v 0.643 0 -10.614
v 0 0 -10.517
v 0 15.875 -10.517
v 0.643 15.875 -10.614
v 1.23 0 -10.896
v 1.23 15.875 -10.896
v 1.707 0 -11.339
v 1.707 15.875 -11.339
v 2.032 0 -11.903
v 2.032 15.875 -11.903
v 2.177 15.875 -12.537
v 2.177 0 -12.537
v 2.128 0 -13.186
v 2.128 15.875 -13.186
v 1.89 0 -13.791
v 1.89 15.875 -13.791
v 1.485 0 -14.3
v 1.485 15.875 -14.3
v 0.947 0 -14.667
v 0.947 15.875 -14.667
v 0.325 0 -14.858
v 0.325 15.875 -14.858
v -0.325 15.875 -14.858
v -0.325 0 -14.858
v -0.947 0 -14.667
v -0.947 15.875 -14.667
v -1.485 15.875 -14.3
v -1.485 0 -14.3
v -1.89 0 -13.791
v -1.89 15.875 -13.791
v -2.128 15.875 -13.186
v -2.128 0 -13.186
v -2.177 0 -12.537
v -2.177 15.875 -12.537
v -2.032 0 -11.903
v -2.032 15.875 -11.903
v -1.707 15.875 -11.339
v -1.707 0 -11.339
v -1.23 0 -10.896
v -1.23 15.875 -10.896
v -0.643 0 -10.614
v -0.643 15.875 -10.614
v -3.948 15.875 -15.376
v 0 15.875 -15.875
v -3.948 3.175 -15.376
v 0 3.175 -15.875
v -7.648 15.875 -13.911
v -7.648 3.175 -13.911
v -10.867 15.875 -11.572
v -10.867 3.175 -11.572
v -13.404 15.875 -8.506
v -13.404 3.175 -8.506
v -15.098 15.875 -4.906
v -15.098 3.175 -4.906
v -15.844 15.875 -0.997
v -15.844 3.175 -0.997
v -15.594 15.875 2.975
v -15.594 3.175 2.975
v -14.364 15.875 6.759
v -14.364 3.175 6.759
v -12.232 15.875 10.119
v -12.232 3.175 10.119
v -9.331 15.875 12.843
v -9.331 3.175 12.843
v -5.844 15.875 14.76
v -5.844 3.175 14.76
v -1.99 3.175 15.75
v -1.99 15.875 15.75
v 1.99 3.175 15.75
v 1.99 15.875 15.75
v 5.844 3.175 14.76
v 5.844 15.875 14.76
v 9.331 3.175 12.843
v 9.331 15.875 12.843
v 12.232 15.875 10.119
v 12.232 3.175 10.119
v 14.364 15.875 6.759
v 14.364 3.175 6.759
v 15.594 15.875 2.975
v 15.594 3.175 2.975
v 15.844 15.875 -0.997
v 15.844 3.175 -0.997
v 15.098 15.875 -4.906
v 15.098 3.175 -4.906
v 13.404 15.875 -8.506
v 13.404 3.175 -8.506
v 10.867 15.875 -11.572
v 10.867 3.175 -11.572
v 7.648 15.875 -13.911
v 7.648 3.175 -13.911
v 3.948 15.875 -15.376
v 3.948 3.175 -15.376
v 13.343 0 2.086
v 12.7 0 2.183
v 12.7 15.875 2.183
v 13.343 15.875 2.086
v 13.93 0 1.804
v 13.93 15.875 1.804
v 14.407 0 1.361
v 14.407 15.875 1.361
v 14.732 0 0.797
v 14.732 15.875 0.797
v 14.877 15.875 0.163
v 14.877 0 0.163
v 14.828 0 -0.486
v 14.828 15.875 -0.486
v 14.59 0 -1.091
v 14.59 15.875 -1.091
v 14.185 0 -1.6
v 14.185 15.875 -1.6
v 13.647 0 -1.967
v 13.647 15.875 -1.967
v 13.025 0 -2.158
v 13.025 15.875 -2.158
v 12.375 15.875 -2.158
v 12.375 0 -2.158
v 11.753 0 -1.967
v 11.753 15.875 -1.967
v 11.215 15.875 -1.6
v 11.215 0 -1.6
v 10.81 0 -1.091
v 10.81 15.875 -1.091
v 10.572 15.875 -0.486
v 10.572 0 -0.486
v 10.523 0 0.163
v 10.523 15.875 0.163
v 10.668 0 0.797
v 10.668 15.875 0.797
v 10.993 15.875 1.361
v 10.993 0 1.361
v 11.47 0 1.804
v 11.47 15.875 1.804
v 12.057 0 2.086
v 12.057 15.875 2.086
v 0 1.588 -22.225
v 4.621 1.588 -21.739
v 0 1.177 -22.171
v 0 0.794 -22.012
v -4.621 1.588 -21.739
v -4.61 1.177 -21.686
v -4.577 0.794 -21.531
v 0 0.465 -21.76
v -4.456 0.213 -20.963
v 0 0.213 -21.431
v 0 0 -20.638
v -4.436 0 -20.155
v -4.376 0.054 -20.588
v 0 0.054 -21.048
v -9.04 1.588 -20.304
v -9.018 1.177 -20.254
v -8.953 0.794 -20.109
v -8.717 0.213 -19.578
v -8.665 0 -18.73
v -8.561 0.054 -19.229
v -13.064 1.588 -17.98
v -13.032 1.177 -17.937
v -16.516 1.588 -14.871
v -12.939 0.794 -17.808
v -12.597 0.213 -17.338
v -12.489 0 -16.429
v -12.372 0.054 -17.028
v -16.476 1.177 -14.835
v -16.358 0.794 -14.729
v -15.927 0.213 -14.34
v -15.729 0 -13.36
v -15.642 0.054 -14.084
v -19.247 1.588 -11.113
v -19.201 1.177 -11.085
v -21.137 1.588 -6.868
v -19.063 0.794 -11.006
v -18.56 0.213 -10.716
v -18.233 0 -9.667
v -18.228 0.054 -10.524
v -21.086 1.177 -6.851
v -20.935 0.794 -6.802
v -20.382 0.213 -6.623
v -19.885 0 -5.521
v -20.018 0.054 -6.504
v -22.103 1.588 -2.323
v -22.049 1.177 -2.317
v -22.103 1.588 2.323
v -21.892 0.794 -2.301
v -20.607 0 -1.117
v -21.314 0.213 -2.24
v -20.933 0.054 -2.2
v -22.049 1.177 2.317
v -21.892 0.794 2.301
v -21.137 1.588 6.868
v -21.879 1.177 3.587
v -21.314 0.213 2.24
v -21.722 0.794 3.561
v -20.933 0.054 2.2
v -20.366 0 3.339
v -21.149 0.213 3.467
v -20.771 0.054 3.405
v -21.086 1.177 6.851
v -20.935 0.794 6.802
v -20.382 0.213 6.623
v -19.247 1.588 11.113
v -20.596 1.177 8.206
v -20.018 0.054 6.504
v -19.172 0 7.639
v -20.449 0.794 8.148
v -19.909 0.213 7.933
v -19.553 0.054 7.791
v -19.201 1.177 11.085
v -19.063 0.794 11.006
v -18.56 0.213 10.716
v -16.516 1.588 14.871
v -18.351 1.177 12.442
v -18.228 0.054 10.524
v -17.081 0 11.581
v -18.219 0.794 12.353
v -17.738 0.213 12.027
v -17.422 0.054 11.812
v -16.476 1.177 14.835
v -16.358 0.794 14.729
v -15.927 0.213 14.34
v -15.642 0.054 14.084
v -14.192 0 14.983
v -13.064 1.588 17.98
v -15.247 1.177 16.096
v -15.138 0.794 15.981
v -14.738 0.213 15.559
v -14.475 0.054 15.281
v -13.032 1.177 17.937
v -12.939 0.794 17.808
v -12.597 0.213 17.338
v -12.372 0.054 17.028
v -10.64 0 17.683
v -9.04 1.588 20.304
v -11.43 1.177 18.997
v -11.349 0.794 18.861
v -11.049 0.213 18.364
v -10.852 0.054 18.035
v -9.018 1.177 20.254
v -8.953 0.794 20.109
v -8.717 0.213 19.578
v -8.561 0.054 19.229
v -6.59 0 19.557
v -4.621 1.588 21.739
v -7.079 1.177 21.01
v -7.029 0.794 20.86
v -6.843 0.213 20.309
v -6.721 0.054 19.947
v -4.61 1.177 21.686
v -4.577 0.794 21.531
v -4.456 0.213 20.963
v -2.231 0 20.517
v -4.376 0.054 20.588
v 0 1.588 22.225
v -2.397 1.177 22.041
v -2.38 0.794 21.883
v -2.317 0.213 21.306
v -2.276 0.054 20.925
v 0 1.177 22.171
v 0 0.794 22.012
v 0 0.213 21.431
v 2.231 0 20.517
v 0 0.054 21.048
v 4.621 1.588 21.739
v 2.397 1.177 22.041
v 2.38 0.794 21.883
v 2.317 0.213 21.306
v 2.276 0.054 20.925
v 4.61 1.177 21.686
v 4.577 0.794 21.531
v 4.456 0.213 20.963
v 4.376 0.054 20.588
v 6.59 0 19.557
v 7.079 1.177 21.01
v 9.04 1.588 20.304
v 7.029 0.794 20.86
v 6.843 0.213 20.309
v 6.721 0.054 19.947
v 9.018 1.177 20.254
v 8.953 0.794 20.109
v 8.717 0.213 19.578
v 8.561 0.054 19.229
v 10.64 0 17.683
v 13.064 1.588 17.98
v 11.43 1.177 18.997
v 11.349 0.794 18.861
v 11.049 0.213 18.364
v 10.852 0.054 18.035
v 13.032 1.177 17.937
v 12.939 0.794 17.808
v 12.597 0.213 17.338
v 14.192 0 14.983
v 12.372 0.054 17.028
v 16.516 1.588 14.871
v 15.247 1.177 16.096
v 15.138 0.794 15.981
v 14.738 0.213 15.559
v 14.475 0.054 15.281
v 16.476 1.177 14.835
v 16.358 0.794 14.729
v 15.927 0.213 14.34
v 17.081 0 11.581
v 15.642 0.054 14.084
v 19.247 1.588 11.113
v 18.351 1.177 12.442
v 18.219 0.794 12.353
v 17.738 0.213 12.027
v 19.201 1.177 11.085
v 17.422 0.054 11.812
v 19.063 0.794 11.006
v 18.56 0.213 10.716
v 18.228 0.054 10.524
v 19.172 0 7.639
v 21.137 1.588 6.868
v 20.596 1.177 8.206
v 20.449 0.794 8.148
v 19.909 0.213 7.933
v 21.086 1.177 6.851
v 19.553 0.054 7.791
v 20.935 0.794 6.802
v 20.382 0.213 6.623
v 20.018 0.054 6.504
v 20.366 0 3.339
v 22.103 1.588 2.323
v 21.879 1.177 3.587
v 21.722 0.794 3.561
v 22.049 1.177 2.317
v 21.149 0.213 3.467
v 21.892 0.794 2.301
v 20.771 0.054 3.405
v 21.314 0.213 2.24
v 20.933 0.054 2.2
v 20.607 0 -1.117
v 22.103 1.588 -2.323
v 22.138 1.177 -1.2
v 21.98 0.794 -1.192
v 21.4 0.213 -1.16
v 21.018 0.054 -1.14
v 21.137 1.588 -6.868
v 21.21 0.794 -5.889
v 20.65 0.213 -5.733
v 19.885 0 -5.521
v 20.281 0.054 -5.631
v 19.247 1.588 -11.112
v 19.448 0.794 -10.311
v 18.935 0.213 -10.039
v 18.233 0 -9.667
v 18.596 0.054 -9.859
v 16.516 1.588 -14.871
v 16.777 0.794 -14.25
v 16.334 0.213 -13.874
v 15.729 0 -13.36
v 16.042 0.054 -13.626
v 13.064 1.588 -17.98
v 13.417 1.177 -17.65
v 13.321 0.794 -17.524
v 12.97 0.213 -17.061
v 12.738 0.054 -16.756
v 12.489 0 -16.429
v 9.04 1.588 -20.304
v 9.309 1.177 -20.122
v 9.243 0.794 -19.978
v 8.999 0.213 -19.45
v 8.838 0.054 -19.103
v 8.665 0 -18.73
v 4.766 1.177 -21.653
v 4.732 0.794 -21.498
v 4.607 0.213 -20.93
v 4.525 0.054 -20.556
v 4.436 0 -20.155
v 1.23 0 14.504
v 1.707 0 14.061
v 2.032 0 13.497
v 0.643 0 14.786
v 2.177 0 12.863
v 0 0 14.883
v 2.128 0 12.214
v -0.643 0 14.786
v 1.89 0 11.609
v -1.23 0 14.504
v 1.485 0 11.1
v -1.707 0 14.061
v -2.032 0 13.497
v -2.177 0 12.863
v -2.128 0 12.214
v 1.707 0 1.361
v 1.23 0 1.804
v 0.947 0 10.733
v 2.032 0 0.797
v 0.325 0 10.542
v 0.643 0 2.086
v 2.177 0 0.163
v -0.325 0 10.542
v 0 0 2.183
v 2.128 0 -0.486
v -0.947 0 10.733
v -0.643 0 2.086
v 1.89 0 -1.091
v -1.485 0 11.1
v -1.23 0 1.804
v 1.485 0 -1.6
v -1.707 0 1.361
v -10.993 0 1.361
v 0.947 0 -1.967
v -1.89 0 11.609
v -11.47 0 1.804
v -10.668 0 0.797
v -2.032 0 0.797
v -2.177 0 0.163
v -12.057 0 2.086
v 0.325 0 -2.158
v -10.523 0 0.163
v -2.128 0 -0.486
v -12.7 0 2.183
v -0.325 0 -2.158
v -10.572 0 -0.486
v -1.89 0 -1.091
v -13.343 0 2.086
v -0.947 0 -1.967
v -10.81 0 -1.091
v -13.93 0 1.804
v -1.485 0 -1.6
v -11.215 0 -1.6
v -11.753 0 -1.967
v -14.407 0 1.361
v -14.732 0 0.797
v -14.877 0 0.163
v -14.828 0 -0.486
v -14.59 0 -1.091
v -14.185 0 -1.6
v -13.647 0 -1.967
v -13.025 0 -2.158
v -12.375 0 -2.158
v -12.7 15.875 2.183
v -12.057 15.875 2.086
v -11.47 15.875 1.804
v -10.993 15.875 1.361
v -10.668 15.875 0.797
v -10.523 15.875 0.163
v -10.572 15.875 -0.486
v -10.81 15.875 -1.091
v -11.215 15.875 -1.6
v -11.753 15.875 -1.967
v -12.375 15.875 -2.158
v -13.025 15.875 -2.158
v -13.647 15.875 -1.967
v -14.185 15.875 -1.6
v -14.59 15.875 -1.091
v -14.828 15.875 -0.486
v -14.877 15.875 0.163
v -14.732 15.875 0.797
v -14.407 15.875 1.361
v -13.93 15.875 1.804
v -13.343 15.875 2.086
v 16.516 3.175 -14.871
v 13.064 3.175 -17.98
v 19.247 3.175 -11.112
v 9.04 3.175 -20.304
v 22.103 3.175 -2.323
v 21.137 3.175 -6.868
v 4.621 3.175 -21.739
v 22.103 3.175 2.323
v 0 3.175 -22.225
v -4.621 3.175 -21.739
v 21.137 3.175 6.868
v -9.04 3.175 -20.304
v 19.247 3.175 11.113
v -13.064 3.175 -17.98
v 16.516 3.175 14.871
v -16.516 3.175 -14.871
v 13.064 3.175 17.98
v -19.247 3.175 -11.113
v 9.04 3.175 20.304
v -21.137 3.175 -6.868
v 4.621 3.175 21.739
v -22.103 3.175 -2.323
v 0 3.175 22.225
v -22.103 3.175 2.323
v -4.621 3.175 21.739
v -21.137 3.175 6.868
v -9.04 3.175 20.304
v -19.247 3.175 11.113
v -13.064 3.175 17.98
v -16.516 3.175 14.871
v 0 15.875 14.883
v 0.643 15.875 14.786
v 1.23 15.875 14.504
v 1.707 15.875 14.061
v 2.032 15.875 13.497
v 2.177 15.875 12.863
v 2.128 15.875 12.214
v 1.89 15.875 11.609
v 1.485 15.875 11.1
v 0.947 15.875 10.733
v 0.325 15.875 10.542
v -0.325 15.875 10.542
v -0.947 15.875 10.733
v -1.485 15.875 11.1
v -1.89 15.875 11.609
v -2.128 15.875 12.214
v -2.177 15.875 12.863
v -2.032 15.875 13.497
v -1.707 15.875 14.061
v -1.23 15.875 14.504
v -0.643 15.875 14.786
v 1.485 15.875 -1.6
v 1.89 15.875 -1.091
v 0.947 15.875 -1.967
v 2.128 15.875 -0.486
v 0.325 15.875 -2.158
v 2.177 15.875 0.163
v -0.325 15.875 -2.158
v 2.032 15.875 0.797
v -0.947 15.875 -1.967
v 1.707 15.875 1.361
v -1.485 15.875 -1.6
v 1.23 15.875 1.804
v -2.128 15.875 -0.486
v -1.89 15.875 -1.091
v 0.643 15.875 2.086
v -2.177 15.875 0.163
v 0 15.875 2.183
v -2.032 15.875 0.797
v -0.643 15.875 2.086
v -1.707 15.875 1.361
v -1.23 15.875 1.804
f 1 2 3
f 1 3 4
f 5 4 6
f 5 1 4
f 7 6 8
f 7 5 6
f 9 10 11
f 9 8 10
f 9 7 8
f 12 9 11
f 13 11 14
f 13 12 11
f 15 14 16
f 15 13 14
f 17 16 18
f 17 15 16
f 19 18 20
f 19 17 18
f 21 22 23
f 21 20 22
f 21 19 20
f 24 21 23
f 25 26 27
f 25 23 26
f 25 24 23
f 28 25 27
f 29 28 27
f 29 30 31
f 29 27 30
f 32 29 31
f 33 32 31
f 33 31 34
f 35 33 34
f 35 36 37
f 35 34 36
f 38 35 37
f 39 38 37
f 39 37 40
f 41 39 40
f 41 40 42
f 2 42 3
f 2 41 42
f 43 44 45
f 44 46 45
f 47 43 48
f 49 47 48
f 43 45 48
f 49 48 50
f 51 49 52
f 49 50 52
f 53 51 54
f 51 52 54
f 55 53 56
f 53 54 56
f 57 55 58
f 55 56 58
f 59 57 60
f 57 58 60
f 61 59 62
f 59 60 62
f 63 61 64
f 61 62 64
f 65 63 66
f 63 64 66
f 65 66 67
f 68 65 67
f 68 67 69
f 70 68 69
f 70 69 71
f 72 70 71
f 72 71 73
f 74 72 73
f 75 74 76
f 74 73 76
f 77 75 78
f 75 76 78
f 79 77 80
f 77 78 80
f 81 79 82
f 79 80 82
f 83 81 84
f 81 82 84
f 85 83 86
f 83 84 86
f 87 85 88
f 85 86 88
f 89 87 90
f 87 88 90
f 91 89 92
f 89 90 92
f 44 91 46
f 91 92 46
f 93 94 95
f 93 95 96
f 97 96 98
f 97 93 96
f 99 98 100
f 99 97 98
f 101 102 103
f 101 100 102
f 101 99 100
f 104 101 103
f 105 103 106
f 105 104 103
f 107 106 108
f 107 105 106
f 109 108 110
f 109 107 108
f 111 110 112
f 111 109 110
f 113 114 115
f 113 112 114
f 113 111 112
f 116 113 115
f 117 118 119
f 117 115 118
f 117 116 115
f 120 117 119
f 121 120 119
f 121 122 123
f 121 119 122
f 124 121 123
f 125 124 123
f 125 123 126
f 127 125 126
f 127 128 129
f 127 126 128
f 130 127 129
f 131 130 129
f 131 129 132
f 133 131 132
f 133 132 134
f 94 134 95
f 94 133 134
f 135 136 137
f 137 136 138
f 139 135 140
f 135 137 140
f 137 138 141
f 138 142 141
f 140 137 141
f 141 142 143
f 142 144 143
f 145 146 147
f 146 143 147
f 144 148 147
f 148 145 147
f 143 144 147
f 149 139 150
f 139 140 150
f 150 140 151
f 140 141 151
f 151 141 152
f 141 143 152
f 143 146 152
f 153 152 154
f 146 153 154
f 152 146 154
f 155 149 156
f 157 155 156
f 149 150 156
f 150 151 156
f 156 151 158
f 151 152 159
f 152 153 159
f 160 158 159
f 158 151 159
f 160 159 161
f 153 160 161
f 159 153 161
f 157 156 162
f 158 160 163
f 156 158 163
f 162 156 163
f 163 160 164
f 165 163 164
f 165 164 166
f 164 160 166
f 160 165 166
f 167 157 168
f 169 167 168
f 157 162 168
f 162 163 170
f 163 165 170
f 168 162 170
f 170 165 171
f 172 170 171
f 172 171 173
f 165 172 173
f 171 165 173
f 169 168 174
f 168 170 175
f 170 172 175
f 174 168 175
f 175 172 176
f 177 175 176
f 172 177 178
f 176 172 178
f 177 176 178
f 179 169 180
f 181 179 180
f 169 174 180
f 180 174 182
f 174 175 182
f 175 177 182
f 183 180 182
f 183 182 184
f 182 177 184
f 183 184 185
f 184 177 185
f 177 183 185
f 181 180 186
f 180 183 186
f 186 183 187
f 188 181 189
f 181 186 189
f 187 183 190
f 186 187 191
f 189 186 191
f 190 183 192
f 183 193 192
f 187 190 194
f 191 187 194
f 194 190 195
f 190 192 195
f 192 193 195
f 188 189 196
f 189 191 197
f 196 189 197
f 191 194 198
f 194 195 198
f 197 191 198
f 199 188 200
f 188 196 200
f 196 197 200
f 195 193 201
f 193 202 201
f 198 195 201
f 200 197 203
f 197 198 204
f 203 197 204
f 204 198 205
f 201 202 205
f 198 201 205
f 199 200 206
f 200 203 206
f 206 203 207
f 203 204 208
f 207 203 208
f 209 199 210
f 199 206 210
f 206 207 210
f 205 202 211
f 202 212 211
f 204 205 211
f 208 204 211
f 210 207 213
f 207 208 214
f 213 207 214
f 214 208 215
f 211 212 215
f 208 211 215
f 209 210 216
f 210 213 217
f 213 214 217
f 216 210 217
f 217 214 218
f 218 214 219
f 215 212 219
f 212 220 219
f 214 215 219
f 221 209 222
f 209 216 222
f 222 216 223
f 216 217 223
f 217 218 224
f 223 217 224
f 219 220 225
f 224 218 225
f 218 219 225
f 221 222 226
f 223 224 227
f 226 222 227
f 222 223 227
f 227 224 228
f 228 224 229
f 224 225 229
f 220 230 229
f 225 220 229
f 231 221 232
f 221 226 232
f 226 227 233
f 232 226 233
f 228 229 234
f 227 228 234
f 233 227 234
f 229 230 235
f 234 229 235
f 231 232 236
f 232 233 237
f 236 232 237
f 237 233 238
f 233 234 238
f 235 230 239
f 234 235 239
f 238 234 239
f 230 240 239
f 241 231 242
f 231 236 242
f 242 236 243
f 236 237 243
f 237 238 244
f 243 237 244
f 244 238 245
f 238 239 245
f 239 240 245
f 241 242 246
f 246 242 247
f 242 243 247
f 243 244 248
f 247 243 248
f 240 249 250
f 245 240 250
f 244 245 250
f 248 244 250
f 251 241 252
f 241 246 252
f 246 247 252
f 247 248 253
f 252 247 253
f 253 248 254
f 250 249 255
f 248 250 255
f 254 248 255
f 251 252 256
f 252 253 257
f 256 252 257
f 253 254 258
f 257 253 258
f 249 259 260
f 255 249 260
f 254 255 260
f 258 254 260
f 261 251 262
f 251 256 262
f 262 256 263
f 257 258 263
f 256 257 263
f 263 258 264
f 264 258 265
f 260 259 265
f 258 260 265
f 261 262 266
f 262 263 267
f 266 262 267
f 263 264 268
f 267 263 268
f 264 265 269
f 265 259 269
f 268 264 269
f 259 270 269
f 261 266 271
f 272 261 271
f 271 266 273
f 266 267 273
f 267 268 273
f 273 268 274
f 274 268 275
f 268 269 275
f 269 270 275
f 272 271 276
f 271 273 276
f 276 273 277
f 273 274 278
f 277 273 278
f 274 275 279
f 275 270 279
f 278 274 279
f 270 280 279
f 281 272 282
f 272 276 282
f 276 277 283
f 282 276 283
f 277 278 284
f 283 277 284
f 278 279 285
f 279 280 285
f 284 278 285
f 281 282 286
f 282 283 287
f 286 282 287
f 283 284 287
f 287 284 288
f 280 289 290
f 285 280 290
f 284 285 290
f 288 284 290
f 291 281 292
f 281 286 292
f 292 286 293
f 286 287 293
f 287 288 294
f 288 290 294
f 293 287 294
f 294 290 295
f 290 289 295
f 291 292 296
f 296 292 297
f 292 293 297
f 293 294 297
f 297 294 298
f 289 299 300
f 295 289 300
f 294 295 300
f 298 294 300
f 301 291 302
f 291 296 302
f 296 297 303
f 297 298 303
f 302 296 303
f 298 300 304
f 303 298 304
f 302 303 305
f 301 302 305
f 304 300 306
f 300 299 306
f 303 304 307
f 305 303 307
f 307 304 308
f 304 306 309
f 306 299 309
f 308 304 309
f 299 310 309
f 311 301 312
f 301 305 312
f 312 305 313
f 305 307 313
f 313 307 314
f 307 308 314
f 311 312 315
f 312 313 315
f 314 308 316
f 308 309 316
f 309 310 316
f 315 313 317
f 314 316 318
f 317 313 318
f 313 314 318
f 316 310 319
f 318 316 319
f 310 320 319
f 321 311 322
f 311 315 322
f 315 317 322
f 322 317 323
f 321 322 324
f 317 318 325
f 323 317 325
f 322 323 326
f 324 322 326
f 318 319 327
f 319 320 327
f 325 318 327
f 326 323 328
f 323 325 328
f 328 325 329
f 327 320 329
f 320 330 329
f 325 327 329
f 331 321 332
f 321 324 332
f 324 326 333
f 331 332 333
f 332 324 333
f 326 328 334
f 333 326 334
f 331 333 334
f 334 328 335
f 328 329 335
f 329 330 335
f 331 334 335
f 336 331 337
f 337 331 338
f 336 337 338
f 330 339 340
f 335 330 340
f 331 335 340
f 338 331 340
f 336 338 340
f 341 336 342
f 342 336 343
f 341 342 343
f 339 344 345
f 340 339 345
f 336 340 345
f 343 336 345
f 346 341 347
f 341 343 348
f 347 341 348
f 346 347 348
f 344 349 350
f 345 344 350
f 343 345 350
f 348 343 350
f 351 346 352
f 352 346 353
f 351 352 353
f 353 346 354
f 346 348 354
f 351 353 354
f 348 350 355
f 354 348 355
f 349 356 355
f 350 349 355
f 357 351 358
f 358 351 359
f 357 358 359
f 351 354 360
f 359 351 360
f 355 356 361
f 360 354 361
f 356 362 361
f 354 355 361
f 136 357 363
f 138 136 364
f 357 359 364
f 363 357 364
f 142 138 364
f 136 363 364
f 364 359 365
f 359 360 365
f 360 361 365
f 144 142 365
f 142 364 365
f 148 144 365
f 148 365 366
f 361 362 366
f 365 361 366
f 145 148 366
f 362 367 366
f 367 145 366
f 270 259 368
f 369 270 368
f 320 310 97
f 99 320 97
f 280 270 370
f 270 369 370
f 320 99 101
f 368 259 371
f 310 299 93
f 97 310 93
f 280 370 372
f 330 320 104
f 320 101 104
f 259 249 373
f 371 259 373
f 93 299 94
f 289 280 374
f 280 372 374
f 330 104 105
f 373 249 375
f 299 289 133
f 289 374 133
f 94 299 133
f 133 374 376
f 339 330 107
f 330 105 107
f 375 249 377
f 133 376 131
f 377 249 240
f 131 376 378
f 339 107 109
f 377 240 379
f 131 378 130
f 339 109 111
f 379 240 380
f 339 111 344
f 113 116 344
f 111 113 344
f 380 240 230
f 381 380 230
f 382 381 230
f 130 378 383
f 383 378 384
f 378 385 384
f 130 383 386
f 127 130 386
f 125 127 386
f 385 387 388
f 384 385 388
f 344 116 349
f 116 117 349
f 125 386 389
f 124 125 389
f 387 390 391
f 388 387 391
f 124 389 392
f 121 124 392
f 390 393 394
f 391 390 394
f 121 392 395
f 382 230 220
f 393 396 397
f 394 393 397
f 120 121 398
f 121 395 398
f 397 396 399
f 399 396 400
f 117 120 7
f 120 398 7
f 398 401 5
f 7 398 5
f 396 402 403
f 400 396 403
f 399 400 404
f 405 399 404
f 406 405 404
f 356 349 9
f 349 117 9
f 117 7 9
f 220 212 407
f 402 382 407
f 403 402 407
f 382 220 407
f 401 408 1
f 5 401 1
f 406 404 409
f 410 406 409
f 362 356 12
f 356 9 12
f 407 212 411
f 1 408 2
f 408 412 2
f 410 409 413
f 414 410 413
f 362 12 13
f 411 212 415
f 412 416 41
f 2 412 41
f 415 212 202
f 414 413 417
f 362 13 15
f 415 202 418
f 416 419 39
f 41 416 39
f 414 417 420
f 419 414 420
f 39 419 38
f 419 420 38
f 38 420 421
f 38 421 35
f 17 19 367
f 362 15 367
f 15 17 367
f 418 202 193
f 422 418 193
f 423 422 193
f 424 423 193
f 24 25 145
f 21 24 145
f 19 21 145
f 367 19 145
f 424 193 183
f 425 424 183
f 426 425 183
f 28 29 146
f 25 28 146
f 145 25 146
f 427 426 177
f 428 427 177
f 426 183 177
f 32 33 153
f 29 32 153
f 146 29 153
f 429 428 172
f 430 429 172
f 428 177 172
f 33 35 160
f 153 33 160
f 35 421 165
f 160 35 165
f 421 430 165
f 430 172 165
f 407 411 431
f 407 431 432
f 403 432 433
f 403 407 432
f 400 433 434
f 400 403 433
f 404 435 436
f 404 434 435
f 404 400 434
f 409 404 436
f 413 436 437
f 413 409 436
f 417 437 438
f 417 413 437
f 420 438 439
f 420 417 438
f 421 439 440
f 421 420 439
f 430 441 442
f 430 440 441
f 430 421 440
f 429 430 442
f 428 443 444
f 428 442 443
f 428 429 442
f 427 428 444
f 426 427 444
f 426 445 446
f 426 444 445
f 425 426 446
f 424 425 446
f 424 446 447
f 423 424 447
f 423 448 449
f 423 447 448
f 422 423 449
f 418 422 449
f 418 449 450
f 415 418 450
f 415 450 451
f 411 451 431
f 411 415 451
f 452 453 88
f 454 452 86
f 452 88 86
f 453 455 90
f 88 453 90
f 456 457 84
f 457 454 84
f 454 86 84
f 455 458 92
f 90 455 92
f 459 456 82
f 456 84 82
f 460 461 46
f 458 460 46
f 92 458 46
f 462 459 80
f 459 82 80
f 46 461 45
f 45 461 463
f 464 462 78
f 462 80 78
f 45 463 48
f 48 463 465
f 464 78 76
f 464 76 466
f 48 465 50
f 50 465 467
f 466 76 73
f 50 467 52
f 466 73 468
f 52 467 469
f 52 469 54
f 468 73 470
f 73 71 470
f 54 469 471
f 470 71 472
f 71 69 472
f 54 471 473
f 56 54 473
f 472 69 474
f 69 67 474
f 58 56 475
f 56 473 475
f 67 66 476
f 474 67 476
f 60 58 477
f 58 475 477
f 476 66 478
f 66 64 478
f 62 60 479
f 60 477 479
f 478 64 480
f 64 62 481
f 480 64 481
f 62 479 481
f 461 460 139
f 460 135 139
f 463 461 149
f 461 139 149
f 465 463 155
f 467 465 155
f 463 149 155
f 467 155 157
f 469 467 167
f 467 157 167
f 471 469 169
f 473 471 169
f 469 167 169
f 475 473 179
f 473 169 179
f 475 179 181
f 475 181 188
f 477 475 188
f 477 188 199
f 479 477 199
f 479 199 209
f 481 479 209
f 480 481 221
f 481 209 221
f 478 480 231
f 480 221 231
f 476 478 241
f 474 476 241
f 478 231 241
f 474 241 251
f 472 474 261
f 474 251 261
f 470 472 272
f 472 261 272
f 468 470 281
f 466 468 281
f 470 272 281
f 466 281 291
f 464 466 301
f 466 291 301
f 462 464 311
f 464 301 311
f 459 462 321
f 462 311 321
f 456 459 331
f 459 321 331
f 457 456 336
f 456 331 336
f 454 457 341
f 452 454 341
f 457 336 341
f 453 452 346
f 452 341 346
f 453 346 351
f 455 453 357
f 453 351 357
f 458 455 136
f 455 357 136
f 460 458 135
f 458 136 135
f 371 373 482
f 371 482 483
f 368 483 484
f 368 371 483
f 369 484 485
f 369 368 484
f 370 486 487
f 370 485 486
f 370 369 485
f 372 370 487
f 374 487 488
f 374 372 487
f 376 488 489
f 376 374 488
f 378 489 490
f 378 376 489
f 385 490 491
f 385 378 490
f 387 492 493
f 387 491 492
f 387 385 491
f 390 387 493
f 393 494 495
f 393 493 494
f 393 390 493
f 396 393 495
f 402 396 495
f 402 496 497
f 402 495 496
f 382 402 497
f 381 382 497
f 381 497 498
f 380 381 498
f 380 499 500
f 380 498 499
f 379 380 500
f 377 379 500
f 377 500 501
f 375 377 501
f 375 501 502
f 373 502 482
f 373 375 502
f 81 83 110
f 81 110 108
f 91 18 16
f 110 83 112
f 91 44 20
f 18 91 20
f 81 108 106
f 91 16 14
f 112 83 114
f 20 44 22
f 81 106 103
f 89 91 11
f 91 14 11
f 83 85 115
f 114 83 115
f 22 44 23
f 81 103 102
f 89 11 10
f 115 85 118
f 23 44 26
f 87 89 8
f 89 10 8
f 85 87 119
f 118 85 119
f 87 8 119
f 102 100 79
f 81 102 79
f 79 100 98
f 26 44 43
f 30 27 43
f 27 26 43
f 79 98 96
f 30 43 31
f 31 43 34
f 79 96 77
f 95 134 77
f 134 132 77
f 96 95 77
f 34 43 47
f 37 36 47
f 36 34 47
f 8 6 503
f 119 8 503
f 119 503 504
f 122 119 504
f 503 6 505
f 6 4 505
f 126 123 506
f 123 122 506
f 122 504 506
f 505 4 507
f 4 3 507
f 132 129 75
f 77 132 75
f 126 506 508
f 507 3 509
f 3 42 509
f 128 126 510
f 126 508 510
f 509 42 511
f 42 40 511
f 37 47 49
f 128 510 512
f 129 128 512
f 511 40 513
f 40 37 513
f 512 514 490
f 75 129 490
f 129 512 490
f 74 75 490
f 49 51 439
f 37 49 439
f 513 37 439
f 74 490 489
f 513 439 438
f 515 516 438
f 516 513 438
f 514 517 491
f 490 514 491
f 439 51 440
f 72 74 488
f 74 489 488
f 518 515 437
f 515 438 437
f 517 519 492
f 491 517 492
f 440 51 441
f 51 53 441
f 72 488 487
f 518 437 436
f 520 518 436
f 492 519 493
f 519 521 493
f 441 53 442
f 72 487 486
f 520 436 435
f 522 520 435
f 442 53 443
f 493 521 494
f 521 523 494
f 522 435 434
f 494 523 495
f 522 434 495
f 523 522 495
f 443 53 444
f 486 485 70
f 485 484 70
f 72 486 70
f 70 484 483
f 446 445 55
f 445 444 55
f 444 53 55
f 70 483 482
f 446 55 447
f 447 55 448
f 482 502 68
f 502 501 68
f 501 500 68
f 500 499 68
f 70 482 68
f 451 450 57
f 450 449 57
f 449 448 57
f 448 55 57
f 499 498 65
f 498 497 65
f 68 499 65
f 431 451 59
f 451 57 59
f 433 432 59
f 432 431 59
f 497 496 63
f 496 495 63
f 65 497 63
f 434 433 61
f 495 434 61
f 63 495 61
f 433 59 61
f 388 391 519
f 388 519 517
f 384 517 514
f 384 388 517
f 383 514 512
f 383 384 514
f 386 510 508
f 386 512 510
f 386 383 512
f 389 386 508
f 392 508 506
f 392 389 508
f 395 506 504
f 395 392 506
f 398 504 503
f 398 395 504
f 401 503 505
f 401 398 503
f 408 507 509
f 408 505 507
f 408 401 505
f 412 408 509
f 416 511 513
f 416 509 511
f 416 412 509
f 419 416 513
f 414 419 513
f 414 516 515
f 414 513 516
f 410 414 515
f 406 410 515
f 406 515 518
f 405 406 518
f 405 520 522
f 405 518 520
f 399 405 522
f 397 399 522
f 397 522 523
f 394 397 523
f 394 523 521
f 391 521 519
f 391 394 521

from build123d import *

# Parameters (mm, degrees)
CUT_EXTRUDE1_DEPTH      = 36.212453408
CUT_EXTRUDE1_DEPTH_BACK = 36.212453408
SKETCH3_R               = 2.1828125


with BuildPart() as part:
    # Sketch1 → Revolve2 (revolve)
    with BuildSketch(Plane.XY, mode=Mode.PRIVATE) as revolve2_sk:
        with BuildLine():
            Line((0, 0), (0, 15.875))
            Line((0, 15.875), (15.875, 15.875))
            Line((15.875, 15.875), (15.875, 3.175))
            Line((15.875, 3.175), (22.225, 3.175))
            Line((22.225, 3.175), (22.225, 1.5875))
            ThreePointArc((22.225, 1.5875), (21.760032015, 0.464967985), (20.6375, 0))
            Line((20.6375, 0), (0, 0))
        make_face()
    revolve(revolve2_sk.sketch.rotate(Axis((0, 0, 0), (0, 1, 0)), 90), axis=Axis((0, 0, 0), (0, 1, 0)))

    # Sketch3 → Cut-Extrude1 (cut, two sides: drawn at the far end of the back side and taken through both)
    with BuildSketch(Plane(origin=(0, 15.875, 0), x_dir=(1, 0, 0), z_dir=(0, 1, 0)).offset(-CUT_EXTRUDE1_DEPTH_BACK)):
        with Locations(Location((0, 0, 0), (0, 0, 270))):
            Circle(SKETCH3_R)
        with Locations(Location((12.7, 0, 0), (0, 0, 270))):
            Circle(SKETCH3_R)
        with Locations(Location((-12.7, 0, 0), (0, 0, 270))):
            Circle(SKETCH3_R)
        with Locations(Location((0, -12.7, 0), (0, 0, 270))):
            Circle(SKETCH3_R)
        with Locations(Location((0, 12.7, 0), (0, 0, 270))):
            Circle(SKETCH3_R)
    extrude(amount=CUT_EXTRUDE1_DEPTH + CUT_EXTRUDE1_DEPTH_BACK, mode=Mode.SUBTRACT)


solid = part.part
